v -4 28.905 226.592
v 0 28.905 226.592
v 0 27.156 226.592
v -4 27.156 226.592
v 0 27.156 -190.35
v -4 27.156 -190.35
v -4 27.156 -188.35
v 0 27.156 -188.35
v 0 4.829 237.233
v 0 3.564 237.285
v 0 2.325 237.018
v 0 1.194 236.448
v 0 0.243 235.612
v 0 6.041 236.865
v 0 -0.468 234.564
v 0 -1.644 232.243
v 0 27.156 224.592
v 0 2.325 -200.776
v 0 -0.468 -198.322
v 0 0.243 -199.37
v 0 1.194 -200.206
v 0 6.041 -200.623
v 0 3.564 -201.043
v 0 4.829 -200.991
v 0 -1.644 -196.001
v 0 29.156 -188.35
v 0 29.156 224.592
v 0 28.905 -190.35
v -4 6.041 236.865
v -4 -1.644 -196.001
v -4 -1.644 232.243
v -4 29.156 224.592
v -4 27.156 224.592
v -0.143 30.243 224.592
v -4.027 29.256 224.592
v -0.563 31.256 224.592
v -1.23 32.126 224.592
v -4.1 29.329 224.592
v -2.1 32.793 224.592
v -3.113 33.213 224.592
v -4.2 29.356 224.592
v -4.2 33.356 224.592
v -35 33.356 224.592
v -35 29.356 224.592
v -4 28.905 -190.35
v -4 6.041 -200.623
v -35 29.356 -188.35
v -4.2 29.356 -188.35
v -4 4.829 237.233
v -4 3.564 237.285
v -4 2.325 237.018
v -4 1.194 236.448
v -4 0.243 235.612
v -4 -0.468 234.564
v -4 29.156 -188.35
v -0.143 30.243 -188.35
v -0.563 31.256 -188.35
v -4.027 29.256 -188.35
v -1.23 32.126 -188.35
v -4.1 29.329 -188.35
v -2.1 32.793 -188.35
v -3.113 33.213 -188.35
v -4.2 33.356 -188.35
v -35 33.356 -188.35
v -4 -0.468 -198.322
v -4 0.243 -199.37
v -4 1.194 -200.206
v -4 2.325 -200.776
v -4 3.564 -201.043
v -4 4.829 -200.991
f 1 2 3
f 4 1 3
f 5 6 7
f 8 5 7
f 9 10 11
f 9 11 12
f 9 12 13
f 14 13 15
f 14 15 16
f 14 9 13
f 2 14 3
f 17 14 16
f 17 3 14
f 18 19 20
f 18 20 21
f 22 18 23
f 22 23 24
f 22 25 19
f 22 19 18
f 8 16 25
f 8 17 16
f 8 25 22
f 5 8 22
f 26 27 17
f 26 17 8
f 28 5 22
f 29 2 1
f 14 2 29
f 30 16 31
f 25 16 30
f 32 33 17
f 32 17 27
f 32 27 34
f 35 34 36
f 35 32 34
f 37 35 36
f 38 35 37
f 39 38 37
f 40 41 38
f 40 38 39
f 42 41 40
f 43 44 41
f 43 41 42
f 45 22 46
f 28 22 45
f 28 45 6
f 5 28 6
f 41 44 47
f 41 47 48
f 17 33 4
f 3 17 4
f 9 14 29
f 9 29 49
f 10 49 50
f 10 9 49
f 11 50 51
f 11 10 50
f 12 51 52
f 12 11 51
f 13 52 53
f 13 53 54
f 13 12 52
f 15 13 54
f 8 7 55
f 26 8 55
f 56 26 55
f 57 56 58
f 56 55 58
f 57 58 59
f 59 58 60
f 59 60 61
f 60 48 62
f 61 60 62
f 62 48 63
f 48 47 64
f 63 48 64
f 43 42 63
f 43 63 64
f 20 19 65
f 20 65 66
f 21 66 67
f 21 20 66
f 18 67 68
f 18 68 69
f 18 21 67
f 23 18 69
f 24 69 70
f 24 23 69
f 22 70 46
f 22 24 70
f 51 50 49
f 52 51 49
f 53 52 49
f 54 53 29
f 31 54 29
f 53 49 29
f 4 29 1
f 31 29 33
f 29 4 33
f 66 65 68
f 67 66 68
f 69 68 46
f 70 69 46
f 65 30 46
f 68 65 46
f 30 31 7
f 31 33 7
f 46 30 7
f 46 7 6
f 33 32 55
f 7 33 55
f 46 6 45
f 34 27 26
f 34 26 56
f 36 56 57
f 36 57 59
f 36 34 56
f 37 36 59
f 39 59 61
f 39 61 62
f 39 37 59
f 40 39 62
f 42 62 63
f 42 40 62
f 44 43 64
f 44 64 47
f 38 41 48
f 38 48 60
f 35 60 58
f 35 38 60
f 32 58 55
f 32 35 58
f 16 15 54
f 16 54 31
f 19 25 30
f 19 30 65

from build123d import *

# Parameters (mm, degrees)
BASE_FLANGE1_DEPTH            = 4
EDGE_FLANGE1_STRIP_W          = 16.4
EDGE_FLANGE1_STRIP_H          = 4
EDGE_FLANGE1_STRIP_CUT_DEPTH  = 412.942027617
EDGE_FLANGE1_RELIEF_W         = 18.4
EDGE_FLANGE1_RELIEF_H         = 2
EDGE_FLANGE1_RELIEF_CUT_DEPTH = 4
EDGE_FLANGE1_DEPTH            = 412.942027617


# Sheet-metal steps are written as plain solids
with BuildPart() as part:
    # Sketch1 → Base-Flange1 (new body)
    with BuildSketch(Plane(origin=(0, 0, 0), x_dir=(0, 0, -1), z_dir=(1, 0, 0))):
        with BuildLine():
            Line((188.350009653, 33.355878637), (-224.592017965, 33.355878637))
            Line((-224.592017965, 33.355878637), (-236.864654255, 6.041062278))
            ThreePointArc((-236.864654255, 6.041062278), (-237.017988994, 2.32545676), (-234.563610744, -0.468333375))
            Line((-234.563610744, -0.468333375), (-232.242884183, -1.644121363))
            Line((-232.242884183, -1.644121363), (196.000875871, -1.644121363))
            Line((196.000875871, -1.644121363), (198.321602432, -0.468333375))
            ThreePointArc((198.321602432, -0.468333375), (200.775980682, 2.32545676), (200.622645942, 6.041062278))
            Line((200.622645942, 6.041062278), (188.350009653, 33.355878637))
        make_face()
    extrude(amount=-BASE_FLANGE1_DEPTH)

    # Edge-Flange1 strip (across the edge) → Edge-Flange1 strip cut (cut)
    with BuildSketch(Plane(origin=(-4, 33.355878637, 224.592017965), x_dir=(0, -1, 0), z_dir=(0, 0, -1))):
        with Locations((-4, -2)):
            Rectangle(EDGE_FLANGE1_STRIP_W, EDGE_FLANGE1_STRIP_H)
    extrude(amount=EDGE_FLANGE1_STRIP_CUT_DEPTH, mode=Mode.SUBTRACT)

    # Edge-Flange1 relief (on the sheet) → Edge-Flange1 relief cut (cut)
    with BuildSketch(Plane(origin=(-4, 29.155878637, 224.592017965), x_dir=(0, -1, 0), z_dir=(-1, 0, 0))):
        with Locations((-7.2, 1)):
            Rectangle(EDGE_FLANGE1_RELIEF_W, EDGE_FLANGE1_RELIEF_H)
        with Locations((-7.2, -413.942027617)):
            Rectangle(EDGE_FLANGE1_RELIEF_W, EDGE_FLANGE1_RELIEF_H)
    extrude(amount=-EDGE_FLANGE1_RELIEF_CUT_DEPTH, mode=Mode.SUBTRACT)

    # Edge-Flange1 section (across the edge) → Edge-Flange1 (add)
    with BuildSketch(Plane(origin=(-4, 33.355878637, 224.592017965), x_dir=(0, -1, 0), z_dir=(0, 0, -1))):
        with BuildLine():
            Line((0, 0.2), (0, 31))
            Line((0, 31), (4, 31))
            Line((4, 31), (4, 0.2))
            ThreePointArc((4, 0.2), (4.058578644, 0.058578644), (4.2, 0))
            Line((4.2, 0), (4.2, -4))
            ThreePointArc((4.2, -4), (1.230151519, -2.769848481), (0, 0.2))
        make_face()
    extrude(amount=EDGE_FLANGE1_DEPTH)


solid = part.part
